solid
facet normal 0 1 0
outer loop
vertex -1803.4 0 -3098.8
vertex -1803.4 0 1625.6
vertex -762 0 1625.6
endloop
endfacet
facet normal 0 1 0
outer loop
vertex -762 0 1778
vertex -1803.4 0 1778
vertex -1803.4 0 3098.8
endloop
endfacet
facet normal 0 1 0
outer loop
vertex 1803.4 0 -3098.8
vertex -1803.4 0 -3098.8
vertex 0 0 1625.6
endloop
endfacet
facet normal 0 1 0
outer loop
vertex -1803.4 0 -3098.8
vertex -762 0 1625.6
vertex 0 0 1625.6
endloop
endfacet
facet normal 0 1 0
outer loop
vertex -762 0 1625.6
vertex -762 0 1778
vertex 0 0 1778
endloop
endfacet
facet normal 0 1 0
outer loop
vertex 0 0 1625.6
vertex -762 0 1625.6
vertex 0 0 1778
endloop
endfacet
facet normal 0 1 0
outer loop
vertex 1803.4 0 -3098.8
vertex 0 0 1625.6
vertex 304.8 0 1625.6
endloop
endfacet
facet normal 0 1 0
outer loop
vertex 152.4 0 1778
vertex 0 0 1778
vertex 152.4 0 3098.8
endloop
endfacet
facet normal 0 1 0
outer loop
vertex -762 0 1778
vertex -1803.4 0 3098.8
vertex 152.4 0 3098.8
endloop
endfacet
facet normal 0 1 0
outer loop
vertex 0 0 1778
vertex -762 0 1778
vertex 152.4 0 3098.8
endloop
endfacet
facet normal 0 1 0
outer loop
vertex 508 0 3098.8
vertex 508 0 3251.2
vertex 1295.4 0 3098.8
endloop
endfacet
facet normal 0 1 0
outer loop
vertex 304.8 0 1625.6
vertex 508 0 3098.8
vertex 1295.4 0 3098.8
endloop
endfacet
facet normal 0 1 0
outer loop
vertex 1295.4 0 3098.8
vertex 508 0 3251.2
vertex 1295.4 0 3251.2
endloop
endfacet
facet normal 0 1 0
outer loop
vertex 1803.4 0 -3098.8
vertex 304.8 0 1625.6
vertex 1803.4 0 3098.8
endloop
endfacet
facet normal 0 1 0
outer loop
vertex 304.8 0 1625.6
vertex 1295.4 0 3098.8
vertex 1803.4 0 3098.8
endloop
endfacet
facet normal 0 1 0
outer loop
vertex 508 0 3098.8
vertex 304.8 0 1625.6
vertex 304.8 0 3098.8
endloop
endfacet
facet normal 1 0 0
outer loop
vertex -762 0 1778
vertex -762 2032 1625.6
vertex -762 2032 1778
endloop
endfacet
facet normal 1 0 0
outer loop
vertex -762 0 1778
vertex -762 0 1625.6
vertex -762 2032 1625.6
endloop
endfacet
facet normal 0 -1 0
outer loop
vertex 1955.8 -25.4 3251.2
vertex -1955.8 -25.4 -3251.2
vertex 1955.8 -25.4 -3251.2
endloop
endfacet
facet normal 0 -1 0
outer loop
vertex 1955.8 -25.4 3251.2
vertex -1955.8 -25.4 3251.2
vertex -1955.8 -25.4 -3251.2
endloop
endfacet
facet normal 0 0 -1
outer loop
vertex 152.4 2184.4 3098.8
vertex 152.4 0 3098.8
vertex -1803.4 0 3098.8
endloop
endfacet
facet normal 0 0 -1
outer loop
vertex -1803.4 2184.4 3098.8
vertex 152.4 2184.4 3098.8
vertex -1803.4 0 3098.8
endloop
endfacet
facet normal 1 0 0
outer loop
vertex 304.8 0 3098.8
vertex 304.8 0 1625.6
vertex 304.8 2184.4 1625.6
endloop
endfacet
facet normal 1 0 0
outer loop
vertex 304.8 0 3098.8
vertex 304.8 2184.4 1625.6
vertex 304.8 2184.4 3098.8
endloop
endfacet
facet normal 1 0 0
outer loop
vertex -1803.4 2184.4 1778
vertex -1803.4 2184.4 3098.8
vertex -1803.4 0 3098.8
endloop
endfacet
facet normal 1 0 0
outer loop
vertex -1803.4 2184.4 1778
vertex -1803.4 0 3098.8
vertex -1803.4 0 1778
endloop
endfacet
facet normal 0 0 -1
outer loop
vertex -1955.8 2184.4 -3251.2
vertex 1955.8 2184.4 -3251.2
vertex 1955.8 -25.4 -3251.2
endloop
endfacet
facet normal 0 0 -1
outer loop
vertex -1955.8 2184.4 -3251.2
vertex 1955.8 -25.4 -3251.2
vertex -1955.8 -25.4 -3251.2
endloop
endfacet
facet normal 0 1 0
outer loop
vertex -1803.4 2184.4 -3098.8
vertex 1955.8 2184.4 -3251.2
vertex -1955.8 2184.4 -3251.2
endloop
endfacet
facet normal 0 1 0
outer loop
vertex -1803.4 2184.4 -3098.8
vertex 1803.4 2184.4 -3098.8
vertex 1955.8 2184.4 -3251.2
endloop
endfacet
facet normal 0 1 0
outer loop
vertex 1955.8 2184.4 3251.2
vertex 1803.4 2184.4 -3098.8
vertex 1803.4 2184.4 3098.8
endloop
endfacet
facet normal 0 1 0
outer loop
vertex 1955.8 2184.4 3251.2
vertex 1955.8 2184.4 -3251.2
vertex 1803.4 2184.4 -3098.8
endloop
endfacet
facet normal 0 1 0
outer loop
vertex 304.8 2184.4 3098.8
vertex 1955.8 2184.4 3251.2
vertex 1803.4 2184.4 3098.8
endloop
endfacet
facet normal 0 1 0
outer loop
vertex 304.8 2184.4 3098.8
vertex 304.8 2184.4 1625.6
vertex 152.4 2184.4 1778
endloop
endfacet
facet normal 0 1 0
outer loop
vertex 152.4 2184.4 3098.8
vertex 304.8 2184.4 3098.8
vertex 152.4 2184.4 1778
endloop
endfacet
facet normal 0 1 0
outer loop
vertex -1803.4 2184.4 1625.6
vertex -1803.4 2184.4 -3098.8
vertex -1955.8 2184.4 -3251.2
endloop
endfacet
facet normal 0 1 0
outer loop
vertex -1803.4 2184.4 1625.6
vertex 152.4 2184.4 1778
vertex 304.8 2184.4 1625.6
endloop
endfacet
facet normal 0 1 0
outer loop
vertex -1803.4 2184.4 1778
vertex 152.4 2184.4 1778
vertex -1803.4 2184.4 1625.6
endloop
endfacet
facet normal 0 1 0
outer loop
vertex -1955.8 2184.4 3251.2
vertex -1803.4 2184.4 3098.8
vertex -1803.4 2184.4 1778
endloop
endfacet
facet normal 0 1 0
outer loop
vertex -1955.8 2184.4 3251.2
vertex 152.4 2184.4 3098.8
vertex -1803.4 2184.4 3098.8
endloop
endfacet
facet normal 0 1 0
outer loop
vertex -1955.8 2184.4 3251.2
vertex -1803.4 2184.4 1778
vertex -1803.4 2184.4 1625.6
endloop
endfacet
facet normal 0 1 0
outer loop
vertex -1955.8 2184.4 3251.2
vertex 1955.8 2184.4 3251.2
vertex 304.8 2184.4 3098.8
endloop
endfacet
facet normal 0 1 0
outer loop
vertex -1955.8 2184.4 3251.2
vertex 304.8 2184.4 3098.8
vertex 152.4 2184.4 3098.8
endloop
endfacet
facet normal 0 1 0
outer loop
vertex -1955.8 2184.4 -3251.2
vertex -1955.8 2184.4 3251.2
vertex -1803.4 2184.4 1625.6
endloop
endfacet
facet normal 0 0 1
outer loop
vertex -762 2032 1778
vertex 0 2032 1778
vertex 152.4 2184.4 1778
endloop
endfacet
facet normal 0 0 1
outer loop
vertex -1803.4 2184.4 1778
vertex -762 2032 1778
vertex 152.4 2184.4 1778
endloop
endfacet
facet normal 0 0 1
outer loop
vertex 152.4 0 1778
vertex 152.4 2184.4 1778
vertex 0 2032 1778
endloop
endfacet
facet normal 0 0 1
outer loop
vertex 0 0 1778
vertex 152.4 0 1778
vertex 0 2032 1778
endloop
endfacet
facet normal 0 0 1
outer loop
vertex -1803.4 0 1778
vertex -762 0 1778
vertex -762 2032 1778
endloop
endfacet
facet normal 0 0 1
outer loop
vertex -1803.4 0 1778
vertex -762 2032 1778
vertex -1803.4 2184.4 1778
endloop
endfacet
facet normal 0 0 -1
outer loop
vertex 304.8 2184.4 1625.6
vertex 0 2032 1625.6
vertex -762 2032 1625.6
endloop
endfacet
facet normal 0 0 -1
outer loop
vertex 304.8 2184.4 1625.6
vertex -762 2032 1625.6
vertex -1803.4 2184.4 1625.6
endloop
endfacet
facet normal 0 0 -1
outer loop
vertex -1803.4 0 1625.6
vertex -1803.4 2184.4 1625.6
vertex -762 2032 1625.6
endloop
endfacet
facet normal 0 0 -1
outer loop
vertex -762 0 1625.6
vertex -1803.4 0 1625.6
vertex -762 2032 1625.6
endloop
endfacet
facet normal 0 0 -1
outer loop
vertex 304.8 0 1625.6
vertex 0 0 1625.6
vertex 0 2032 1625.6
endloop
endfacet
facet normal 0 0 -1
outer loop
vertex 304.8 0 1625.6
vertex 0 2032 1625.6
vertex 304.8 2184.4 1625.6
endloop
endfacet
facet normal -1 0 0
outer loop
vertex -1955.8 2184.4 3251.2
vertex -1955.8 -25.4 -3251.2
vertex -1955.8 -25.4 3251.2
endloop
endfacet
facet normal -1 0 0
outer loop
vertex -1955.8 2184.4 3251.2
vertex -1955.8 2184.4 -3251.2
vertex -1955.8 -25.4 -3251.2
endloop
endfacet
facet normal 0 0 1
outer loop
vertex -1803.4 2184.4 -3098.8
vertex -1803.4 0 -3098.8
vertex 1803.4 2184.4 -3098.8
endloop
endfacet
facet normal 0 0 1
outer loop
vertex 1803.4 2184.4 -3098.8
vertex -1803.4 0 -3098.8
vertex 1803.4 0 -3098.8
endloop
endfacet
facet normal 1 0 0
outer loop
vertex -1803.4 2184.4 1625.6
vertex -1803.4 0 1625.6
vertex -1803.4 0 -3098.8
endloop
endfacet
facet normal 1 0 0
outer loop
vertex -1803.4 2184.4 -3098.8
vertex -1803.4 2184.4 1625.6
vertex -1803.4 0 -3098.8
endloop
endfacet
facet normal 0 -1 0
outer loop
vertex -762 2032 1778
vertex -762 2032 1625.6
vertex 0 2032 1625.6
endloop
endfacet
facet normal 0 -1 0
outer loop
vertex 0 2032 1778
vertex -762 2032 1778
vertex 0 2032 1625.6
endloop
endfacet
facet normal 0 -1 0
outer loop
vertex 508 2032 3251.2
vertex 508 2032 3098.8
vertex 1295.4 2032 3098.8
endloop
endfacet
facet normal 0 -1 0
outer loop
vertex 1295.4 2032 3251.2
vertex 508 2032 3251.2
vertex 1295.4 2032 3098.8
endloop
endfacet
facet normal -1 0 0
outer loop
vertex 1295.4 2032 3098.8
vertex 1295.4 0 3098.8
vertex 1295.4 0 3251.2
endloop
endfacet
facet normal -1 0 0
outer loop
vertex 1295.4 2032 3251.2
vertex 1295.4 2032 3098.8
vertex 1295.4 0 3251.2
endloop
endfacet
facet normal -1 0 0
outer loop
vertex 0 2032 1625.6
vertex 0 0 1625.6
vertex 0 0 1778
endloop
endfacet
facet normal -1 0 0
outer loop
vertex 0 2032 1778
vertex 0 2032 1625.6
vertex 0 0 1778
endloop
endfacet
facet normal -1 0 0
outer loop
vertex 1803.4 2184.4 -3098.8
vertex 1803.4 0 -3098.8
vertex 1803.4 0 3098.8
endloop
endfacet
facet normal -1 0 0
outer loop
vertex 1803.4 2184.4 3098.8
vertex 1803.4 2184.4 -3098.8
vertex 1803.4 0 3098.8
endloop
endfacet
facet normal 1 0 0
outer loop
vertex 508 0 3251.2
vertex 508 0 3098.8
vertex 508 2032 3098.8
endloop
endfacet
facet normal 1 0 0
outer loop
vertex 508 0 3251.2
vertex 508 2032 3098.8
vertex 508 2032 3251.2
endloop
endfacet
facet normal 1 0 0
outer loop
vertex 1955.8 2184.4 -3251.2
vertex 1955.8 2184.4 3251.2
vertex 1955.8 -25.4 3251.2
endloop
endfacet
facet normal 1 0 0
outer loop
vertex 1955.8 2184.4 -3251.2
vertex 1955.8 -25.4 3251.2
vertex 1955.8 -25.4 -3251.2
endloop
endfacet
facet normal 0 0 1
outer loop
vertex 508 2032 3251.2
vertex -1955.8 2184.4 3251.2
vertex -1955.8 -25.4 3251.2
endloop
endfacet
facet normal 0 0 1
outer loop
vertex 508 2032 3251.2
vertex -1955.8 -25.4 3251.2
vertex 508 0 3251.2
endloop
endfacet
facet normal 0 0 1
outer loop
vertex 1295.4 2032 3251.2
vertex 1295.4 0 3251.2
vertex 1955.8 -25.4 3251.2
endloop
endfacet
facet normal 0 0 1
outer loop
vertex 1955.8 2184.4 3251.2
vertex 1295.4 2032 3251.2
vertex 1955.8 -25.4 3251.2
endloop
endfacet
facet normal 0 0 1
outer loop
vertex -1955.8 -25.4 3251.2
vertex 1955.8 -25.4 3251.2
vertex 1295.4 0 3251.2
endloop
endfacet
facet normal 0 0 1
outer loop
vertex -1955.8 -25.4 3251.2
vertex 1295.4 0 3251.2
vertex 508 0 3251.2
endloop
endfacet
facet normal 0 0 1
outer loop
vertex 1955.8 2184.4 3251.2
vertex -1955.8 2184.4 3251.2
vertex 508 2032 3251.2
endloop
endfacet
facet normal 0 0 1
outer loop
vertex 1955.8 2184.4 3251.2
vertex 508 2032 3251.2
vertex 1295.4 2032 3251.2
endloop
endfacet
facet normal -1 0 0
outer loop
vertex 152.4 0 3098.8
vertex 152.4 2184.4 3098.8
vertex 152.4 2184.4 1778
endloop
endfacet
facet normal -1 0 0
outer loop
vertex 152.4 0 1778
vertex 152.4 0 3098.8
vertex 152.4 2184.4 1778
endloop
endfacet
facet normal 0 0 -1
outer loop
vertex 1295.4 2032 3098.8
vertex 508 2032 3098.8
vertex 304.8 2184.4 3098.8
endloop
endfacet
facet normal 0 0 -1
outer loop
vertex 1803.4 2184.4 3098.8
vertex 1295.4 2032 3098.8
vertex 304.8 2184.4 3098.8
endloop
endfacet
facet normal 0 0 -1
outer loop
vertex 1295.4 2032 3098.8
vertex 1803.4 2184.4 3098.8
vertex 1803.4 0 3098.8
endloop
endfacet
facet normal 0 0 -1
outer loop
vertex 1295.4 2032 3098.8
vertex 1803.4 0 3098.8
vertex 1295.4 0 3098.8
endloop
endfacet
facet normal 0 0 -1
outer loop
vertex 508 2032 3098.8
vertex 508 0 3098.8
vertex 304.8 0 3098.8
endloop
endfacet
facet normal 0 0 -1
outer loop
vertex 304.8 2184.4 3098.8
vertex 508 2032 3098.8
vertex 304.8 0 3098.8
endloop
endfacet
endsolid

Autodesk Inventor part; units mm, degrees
ref_plane "YZ Plane" through (0, 0, 0) normal (1, 0, 0) x (0, 1, 0)
ref_plane "XZ Plane" through (0, 0, 0) normal (0, 1, 0) x (-1, 0, 0)
ref_plane "XY Plane" through (0, 0, 0) normal (0, 0, 1) x (1, 0, 0)
sketch "Sketch1" plane through (0, 0, 0) normal (0, 1, 0) x (-1, 0, 0)
  line L0 (1955.8, -3251.2) -> (-1955.8, -3251.2)
  line L1 (-1955.8, -3251.2) -> (-1955.8, 3251.2)
  line L2 (1955.8, 3251.2) -> (1955.8, -3251.2)
  line L3 (2738.12, 0) -> (-2738.12, 0) projected
  line L4 (0, -4551.68) -> (0, 4551.68) projected
  line L5 (1803.4, -3098.8) -> (-1803.4, -3098.8)
  line L6 (-1803.4, -3098.8) -> (-1803.4, 3098.8)
  line L7 (-152.4, 3098.8) -> (-152.4, 1778)
  line L8 (-304.8, 1625.6) -> (-304.8, 3098.8)
  line L9 (-508, 3098.8) -> (-508, 3251.2)
  line L10 (-1295.4, 3098.8) -> (-1295.4, 3251.2)
  line L11 (-1803.4, 3098.8) -> (-1295.4, 3098.8)
  line L12 (-1955.8, 3251.2) -> (-1295.4, 3251.2)
  line L13 (-508, 3251.2) -> (1955.8, 3251.2)
  line L14 (-508, 3098.8) -> (-304.8, 3098.8)
  line L15 (-152.4, 3098.8) -> (1803.4, 3098.8)
  line L16 (762, 1625.6) -> (762, 1778)
  line L17 (0, 1625.6) -> (0, 1778)
  line L18 (1803.4, 1625.6) -> (762, 1625.6)
  line L19 (0, 1625.6) -> (-304.8, 1625.6)
  line L20 (-152.4, 1778) -> (0, 1778)
  line L21 (762, 1778) -> (1803.4, 1778)
  line L22 (1803.4, 3098.8) -> (1803.4, 1778)
  line L23 (1803.4, 1625.6) -> (1803.4, -3098.8)
  point P0 (0, 0)
  dimension "d0" = 3911.6
  dimension "d3" = 152.4
  dimension "d4" = 152.4
  dimension "d6" = 152.4
  dimension "d11" = 508
  dimension "d12" = 787.4
  dimension "d14" = 6502.4
  dimension "d16" = 152.4
  dimension "d17" = 152.4
  dimension "d19" = 1473.2
  dimension "d20" = 152.4
  dimension "d21" = 762
  dimension "d22" = 1498.6
  dimension "d25" = 1193.8
extrude "Extrusion1" add sketch "Sketch1" along normal blind 2184.4 contours L0 L4 L5 L23 L3 L2 | L0 L1 L3 L6 L5 L4 | L3 L23 L18 L16 L21 L22 L15 L4 L13 L2 | L1 L12 L10 L11 L6 L3 | L4 L15 L7 L20 L19 L8 L14 L9 L13
sketch "Sketch2" plane through (0, 0, 0) normal (0, -1, 0) x (1, 0, 0)
  line L0 (-1955.8, 3251.2) -> (1955.8, 3251.2)
  line L1 (1955.8, 3251.2) -> (1955.8, -3251.2)
  line L2 (1955.8, -3251.2) -> (-1955.8, -3251.2)
  line L3 (-1955.8, -3251.2) -> (-1955.8, 3251.2)
  point P0 (0, 0)
extrude "Extrusion2" add sketch "Sketch2" along normal blind 25.4
sketch "Sketch3" plane through (0, 2184.4, 0) normal (0, 1, 0) x (1, 0, 0)
  line L0 (-762, -1625.6) -> (0, -1625.6)
  line L1 (0, -1625.6) -> (0, -1778)
  line L2 (0, -1778) -> (-762, -1778)
  line L3 (-762, -1778) -> (-762, -1625.6)
  line L4 (508, -3098.8) -> (1295.4, -3098.8)
  line L5 (1295.4, -3098.8) -> (1295.4, -3251.2)
  line L6 (1295.4, -3251.2) -> (508, -3251.2)
  line L7 (508, -3251.2) -> (508, -3098.8)
  point P0 (0, 0)
extrude "Extrusion3" add sketch "Sketch3" against normal blind 152.4
properties part number "289 Manning Basement"
